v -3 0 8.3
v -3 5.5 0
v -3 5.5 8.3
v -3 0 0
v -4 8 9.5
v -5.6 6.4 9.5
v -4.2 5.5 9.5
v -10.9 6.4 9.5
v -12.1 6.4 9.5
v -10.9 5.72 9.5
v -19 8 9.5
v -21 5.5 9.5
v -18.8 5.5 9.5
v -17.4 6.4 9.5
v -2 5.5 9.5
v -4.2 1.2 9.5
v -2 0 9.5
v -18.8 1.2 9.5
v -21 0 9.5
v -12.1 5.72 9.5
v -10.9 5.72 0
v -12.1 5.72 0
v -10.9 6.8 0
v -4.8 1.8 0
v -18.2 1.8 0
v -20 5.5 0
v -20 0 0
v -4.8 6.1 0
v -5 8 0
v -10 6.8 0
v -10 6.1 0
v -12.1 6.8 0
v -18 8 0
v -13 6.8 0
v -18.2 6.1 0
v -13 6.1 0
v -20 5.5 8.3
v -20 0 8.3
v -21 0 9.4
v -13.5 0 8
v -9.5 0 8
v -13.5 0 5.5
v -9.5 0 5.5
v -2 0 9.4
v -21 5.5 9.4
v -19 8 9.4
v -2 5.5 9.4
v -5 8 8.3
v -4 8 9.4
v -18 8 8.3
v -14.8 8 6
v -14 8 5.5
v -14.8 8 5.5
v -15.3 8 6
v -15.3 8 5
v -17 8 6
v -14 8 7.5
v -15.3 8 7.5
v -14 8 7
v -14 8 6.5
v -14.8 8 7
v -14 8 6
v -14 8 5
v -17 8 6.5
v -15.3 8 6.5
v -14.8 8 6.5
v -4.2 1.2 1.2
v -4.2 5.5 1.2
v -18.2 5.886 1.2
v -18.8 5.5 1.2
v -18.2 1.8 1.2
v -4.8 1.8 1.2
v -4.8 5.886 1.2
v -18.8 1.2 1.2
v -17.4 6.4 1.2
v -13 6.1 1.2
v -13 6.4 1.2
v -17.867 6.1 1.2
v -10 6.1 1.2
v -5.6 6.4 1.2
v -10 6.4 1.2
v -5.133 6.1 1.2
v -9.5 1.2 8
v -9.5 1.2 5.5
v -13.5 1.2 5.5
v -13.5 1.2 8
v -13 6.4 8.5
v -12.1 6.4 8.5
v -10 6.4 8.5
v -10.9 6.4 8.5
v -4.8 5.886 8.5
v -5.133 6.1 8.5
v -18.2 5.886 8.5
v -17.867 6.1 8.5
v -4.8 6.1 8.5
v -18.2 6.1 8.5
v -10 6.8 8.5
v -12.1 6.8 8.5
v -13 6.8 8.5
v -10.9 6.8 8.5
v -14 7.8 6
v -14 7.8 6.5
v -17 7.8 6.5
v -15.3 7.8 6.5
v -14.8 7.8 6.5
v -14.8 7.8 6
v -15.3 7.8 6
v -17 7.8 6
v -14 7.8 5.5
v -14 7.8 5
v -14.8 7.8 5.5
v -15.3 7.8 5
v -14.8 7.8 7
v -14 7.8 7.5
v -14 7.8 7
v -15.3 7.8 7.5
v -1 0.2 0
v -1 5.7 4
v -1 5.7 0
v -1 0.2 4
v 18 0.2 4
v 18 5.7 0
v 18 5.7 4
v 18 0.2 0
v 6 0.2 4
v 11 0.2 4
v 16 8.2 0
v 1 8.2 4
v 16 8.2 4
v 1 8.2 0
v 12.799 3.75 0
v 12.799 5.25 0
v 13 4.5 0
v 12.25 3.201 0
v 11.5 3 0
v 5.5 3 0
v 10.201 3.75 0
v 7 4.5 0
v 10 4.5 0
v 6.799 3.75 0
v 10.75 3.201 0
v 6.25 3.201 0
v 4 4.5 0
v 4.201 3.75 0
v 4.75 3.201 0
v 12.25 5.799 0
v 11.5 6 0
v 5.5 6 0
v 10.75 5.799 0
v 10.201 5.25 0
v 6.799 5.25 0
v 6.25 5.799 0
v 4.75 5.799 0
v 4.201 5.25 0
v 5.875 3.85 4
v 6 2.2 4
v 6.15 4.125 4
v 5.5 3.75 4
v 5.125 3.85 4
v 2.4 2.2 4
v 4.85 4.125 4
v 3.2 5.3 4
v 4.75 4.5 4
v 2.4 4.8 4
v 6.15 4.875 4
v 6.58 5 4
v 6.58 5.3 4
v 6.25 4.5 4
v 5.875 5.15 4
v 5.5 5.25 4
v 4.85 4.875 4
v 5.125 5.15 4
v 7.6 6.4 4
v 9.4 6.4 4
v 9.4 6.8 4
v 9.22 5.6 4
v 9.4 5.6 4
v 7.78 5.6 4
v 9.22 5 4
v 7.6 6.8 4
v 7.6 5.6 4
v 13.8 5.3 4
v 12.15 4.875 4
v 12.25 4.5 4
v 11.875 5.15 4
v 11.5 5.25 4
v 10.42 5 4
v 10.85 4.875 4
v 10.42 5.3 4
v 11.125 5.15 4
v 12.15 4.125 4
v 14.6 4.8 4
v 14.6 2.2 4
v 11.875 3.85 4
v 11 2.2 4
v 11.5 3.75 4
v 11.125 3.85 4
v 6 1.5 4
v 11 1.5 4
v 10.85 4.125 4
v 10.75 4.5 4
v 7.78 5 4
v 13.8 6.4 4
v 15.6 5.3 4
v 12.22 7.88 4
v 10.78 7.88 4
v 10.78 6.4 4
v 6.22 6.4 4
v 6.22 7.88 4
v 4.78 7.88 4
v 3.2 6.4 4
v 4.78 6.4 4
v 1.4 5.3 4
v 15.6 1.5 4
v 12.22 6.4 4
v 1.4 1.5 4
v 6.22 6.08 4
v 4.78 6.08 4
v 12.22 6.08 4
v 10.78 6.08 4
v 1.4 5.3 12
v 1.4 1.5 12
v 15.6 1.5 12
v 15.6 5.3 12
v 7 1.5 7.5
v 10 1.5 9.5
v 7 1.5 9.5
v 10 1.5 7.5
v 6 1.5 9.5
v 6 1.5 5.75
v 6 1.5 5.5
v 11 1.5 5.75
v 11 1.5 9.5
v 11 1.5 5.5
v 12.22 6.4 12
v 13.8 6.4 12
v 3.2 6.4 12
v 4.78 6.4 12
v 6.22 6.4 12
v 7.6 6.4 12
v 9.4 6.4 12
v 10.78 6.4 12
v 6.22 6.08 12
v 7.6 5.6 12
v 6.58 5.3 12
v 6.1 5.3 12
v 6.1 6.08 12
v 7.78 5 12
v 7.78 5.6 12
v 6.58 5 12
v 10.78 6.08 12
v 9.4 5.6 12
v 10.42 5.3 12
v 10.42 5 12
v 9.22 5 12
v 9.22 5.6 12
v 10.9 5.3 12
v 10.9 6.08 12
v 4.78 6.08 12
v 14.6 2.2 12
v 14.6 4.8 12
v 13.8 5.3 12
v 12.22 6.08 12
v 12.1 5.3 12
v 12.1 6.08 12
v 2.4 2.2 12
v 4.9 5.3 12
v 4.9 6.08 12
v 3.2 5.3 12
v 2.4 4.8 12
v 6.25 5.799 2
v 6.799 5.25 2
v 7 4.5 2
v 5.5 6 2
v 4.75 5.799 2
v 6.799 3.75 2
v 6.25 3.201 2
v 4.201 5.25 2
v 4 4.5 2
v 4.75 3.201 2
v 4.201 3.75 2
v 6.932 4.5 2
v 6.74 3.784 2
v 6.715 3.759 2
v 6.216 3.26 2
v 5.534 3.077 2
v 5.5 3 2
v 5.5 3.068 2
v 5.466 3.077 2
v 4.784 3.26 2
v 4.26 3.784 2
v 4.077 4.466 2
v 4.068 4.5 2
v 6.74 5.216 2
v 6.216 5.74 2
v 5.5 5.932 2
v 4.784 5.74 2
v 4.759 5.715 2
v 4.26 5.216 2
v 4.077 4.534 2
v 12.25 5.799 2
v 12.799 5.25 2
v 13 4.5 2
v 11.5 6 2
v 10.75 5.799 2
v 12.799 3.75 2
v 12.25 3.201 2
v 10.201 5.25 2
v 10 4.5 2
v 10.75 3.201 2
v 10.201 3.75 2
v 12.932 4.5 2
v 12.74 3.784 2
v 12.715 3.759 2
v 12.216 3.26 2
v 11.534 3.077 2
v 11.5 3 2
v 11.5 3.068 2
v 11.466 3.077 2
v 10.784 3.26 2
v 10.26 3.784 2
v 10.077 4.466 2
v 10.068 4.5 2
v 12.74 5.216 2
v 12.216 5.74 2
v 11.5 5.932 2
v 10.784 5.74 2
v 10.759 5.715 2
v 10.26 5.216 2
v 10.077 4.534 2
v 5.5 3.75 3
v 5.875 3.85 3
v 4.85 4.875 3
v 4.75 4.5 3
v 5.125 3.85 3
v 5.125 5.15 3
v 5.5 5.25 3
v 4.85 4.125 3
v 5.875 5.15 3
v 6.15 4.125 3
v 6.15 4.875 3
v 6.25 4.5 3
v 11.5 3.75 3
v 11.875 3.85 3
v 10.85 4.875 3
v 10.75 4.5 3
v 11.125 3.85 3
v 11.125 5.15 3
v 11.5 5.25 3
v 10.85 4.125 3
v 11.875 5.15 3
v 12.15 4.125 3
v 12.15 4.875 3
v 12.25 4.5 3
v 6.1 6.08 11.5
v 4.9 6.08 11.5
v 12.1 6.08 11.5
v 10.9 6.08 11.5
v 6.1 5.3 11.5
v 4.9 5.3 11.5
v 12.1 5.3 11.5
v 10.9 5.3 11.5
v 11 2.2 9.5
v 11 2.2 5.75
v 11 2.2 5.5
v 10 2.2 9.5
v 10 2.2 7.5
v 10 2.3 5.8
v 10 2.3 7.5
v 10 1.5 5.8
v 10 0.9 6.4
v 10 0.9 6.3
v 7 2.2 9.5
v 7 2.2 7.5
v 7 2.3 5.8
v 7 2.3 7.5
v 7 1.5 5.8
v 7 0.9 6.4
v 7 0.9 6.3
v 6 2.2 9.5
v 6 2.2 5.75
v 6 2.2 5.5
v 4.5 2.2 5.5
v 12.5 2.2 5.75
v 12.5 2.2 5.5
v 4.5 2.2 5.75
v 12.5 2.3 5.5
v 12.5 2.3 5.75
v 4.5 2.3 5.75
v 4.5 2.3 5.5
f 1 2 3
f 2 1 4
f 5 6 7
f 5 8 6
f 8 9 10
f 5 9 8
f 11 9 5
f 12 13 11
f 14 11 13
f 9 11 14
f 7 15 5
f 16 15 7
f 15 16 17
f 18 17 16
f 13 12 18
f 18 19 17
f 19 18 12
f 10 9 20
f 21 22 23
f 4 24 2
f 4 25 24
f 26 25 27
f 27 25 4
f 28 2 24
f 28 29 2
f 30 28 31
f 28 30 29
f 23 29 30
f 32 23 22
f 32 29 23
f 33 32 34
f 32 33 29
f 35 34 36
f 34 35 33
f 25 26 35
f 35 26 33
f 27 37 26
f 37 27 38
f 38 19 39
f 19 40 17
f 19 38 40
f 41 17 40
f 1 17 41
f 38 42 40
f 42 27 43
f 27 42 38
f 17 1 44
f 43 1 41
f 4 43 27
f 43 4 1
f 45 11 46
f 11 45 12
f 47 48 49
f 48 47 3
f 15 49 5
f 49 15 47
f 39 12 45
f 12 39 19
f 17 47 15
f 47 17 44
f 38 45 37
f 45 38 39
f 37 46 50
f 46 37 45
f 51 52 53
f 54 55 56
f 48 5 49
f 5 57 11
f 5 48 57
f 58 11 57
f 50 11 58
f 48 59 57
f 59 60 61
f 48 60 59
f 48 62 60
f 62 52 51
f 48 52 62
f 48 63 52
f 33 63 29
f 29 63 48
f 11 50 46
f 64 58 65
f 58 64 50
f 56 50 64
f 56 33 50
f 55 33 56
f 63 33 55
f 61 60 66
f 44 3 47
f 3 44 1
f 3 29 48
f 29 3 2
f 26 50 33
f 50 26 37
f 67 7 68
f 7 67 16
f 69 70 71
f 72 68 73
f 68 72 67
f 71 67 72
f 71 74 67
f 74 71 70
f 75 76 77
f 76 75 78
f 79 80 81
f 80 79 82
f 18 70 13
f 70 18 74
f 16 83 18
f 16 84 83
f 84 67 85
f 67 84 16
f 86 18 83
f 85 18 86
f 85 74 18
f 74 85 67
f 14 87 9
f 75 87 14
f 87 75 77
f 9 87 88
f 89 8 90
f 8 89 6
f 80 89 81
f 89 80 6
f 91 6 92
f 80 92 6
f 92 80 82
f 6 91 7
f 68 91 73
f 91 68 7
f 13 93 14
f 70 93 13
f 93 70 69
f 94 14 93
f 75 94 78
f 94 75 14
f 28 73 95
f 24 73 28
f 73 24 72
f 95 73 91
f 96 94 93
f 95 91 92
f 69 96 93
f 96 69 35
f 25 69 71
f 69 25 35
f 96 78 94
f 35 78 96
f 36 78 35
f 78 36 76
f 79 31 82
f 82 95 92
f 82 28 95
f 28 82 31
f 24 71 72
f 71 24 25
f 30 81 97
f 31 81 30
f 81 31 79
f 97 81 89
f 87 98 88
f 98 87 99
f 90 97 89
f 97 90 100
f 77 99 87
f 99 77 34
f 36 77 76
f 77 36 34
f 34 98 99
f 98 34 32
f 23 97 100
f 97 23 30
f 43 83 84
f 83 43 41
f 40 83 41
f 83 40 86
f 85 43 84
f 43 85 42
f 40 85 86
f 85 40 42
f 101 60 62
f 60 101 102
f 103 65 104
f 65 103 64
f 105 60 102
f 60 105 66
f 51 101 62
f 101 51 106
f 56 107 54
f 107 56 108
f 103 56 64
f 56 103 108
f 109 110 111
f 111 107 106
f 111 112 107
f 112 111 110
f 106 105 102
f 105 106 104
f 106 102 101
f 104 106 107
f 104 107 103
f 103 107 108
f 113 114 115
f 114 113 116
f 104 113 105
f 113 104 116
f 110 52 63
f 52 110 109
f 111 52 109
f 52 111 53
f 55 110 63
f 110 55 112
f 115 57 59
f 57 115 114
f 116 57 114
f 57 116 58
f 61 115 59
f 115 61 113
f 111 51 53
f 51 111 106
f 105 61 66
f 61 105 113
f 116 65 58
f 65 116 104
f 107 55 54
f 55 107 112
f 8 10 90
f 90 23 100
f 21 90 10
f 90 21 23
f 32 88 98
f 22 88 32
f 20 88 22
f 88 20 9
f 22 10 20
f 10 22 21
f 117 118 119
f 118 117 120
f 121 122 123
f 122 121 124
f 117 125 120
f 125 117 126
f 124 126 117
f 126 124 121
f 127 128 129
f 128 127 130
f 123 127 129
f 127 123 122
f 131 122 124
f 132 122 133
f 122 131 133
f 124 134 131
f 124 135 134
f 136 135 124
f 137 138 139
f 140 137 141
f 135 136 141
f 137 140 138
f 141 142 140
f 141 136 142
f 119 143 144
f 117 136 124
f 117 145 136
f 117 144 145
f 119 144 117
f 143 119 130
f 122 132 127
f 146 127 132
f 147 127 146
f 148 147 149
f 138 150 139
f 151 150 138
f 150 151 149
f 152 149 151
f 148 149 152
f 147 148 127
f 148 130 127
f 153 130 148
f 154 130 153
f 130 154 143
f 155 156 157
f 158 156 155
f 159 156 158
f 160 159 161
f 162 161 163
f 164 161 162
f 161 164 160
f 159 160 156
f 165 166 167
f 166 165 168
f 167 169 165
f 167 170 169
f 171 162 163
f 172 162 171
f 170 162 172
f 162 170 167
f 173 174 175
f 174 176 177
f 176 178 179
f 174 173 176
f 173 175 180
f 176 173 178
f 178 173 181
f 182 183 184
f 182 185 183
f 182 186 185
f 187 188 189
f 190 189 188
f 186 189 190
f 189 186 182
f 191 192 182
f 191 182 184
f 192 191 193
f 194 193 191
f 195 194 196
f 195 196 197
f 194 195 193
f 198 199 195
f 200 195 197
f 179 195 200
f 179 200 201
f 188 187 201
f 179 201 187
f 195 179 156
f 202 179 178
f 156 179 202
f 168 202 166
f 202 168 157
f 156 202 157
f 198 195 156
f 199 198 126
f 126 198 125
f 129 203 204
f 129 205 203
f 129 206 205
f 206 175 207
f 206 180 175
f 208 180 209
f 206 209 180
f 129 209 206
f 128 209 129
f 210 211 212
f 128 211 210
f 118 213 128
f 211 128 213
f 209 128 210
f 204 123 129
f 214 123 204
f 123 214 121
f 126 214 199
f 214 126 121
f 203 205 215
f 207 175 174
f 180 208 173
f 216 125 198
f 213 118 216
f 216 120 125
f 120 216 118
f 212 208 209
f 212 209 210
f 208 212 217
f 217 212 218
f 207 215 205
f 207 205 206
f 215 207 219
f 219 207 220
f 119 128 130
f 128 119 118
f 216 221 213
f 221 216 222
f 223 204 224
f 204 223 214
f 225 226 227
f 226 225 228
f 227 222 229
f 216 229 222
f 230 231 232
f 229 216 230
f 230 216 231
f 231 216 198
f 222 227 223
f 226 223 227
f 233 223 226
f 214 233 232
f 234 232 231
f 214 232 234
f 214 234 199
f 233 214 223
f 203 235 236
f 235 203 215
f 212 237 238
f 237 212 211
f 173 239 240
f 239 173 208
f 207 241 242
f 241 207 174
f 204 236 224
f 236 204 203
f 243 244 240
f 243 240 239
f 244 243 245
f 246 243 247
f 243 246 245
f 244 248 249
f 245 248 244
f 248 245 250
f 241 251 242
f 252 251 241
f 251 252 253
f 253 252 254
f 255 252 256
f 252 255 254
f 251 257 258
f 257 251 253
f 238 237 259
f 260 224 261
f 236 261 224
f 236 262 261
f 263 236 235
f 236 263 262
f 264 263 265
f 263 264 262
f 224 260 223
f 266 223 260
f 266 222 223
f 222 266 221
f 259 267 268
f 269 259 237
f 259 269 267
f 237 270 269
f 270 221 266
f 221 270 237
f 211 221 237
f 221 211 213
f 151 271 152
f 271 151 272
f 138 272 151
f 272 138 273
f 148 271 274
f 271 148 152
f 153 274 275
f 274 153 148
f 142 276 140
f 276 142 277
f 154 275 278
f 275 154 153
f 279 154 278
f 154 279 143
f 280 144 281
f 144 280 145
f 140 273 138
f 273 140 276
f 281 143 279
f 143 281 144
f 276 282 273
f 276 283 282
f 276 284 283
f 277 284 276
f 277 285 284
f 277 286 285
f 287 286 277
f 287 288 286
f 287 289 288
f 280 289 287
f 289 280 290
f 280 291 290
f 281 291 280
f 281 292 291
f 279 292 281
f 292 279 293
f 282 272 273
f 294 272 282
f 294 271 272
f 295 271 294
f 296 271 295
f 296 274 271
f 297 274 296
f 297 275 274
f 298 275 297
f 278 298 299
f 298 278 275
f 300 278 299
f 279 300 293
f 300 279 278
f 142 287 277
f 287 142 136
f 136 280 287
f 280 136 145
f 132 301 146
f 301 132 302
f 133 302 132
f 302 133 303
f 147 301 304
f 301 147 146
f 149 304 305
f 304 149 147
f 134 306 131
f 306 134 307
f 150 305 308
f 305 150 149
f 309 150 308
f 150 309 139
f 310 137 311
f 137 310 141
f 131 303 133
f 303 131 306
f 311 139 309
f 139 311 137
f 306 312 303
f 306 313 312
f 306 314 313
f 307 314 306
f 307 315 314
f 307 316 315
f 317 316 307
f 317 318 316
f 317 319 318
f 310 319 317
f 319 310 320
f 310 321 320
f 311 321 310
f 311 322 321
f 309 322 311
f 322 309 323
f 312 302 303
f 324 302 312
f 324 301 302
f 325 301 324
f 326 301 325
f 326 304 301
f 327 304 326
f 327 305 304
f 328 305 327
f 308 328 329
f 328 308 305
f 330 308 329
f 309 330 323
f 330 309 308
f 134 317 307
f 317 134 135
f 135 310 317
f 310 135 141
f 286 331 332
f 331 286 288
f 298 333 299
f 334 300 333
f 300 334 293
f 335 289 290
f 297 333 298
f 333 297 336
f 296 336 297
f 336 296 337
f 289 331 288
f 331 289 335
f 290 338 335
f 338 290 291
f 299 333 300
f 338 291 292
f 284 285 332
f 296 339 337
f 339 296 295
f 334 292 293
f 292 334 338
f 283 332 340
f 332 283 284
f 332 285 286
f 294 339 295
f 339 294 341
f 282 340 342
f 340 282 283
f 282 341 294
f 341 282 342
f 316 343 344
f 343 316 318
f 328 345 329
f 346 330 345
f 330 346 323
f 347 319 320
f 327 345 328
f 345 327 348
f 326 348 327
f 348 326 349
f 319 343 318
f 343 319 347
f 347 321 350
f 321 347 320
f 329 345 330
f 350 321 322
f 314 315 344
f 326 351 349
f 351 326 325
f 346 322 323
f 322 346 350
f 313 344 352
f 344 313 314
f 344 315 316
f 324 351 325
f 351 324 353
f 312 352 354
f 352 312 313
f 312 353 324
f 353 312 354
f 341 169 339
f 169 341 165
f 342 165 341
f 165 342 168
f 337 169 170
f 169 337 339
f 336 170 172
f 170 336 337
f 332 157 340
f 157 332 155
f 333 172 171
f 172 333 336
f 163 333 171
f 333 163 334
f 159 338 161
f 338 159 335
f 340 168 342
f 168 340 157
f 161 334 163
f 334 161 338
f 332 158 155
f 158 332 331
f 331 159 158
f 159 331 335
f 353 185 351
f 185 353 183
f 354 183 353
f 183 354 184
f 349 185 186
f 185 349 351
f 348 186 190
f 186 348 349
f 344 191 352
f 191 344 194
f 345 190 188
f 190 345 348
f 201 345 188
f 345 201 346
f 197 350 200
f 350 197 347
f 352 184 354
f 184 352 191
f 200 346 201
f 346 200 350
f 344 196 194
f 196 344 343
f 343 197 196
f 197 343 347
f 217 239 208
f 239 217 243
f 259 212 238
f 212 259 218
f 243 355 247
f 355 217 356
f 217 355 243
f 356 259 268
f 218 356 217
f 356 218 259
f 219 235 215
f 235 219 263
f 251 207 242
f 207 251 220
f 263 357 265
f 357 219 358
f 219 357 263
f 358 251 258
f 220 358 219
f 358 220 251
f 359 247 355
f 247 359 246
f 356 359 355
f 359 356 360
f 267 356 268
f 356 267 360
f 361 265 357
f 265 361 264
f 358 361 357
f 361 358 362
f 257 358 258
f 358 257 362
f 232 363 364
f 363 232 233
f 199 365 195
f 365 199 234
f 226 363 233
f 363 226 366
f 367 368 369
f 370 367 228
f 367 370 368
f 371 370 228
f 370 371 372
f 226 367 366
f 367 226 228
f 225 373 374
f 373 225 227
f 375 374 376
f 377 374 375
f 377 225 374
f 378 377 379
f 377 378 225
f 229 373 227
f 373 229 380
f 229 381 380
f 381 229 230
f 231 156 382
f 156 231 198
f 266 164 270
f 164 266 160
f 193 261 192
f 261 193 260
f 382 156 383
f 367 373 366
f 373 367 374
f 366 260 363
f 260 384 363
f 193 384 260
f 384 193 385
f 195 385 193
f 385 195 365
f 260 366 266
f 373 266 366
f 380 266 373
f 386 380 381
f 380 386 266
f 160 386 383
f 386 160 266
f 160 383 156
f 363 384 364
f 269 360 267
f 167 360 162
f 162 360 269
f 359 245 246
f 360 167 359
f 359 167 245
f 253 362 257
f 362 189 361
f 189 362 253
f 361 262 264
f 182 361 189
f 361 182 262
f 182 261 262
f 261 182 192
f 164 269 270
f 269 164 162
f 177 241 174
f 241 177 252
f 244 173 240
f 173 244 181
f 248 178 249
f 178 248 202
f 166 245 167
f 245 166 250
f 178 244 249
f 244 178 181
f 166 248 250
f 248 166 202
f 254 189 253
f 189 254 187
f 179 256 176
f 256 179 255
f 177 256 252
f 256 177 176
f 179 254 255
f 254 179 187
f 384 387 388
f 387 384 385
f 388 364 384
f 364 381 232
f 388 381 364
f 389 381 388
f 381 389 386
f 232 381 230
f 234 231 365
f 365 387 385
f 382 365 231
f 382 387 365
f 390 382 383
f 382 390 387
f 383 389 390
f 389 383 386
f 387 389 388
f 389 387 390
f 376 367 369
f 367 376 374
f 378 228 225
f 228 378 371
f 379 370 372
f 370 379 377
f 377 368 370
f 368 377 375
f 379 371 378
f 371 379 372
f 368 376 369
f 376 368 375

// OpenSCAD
////////////////////////////////////////////////////////////////////////////
//
// HUBPLUG - Plastic plug to attach the wires to a bicycle hub dynamo
//           This type of plug is used with most hub dynamos. Stripped
//           wires are pushed through the holes od the inner part and then
//           bent around towards outside before the inner part is pushed
//           into the outer shell.
//
// 2013-08-13 by Heinz Spiess 
//            released on Thingyverse under a
//            Creative Commons - Attribution - Share Alike license
// 
////////////////////////////////////////////////////////////////////////////

L2=17;   // overall length of outer shell
L1=13;   // straight length of outer shell
W2=8;   // overall width of outer shell
W1=5.5; // straight width of outer shell
H=9.5;  // height of outer shell
D=1.2;  // Wall thickness
$fn=12;


module OuterShell(){
difference(){
  union(){
    cube([L2,W1,H]);
    hull(){
      translate([0,0,H-D])cube([L2,W1,0.1]);
      translate([-1,0,H-0.1])cube([L2+2,W1,0.1]);
      translate([(L2-L1)/2,W2-0.1,H-D])cube([L1,0.1,0.1]);
     translate([1,W2-0.1,H-0.1])cube([L1+2,0.1,0.1]);
    }
    hull(){
      translate([0,W1-0.1,0])cube([L2,.1,H]);
      translate([(L2-L1)/2,W2-0.1,0])cube([L1,.1,H]);
    }
  }
  translate([D,D,D])cube([L2-2*D,W1-D,H-D+1]);
  hull(){
      translate([D,W1-0.1,D])cube([L2-2*D,.1,H]);
      translate([(L2-L1)/2+0.5*D,W2-D-0.5,D])cube([L1-D,.1,H]);
  }
  translate([1.5*D,1.5*D,-1])cube([L2-3*D,W1-D,H]);
  translate([L2/2-1.5,W1-0.5,-1])cube([3,1.5*D,H]);
  translate([L2/2-2,-1,5.5])cube([4,2*D,2.5]);
  translate([3,W2-0.2,6])cube([3,0.5,0.5]);
  translate([5,W2-0.2,5])cube([1,0.5,0.5]);
  translate([5,W2-0.2,7])cube([1,0.5,0.5]);
  translate([4.7,W2-0.2,5])cube([0.5,0.3,2.5]);
}

    translate([L2/2-D/2,W2-1.9*D,0])cube([D,1.5*D,H]);
}

module Inset(){
  difference(){
     union(){
       hull(){
         translate([-1,0.2,0])cube([L2+2,W1,4]);
         translate([1,W2+0.1,0])cube([L1+2,0.1,4]);
       }
       hull(){
          translate([D+0.2,1.5,4])cube([L2-2*D-0.4,W1-1.7,8]);
          translate([D+(L2-L1)/2,6.3,4])cube([L1-2*D,0.1,8]);
       }
     }
     for(i=[-1,1]) translate([L2/2+i*3,W2/2+0.5,-1])cylinder(r=1.5,h=3);
     for(i=[-1,1]) translate([L2/2+i*3,W2/2+0.5,1.9])cylinder(r1=1.5, r2=0.75,h=1.1);
     for(i=[-1,1]) translate([L2/2+i*3,W2/2+0.5,2.9])cylinder(r=0.75,h=1.3);
     hull(){
          translate([2*D,2*D-0.2,4])cube([L2-4*D,W1-2.9,H]);
          translate([D+(L2-L1)/2,W2-2*D-0.6,4])cube([L1-2*D,0.3,H]);
     }
    translate([L2/2-0.75*D,W2-2.5*D,4])cube([1.5*D,1.5*D,H]);
    for(i=[-1,1]) translate([L2/2-1.2*D/2+3*i,W2-1.6*D,4])cube([1.2*D,1.5*D,H]);
    for(i=[-1,1]) translate([L2/2-D/2+3*i,W2-2.5*D,H+2])cube([D,1.5*D,H]);
    for(i=[-1,1]) translate([L2/2-2*i-0.5,0,4.5])cube([1,2.5*D,5]);
    translate([L2/2-2.5,0,4])cube([5,2.5*D,2]);
  }
  for(i=[-1.1,1.1]) translate([L2/2-D/2+D*i,W2-2.5*D,4])cube([D,0.5*D,H-1.5]);
  translate([L2/2-4,1.5,5.5])cube([8,0.8,0.25]);
  hull(){
    translate([L2/2-1.5,1.5,5.8])cube([3,0.8,0.1]);
    translate([L2/2-1.5,0.9,6.3])cube([3,1.4,0.1]);
    translate([L2/2-1.5,1.5,7.4])cube([3,0.8,0.1]);
  }

}

// Outer shell with inserted inner part - just for visual verification - don't print!
module Both(){
cut_z = -1; // set to z-coordinate where to "cut" - to see inside.
intersection(){
  union(){
    color("red")translate([L2,-0.2,H+4.1])rotate(a=180,v=[0,1,0])Inset();
    translate([0,0,0])OuterShell();
  }
  // intersect with
  translate([-100,-100,cut_z])cube([200,200,100]);
}
}

translate([-20,0,0])OuterShell();

color("red")translate([0,0,0])Inset();

//
%translate([-L2/2,15,0])Both();
